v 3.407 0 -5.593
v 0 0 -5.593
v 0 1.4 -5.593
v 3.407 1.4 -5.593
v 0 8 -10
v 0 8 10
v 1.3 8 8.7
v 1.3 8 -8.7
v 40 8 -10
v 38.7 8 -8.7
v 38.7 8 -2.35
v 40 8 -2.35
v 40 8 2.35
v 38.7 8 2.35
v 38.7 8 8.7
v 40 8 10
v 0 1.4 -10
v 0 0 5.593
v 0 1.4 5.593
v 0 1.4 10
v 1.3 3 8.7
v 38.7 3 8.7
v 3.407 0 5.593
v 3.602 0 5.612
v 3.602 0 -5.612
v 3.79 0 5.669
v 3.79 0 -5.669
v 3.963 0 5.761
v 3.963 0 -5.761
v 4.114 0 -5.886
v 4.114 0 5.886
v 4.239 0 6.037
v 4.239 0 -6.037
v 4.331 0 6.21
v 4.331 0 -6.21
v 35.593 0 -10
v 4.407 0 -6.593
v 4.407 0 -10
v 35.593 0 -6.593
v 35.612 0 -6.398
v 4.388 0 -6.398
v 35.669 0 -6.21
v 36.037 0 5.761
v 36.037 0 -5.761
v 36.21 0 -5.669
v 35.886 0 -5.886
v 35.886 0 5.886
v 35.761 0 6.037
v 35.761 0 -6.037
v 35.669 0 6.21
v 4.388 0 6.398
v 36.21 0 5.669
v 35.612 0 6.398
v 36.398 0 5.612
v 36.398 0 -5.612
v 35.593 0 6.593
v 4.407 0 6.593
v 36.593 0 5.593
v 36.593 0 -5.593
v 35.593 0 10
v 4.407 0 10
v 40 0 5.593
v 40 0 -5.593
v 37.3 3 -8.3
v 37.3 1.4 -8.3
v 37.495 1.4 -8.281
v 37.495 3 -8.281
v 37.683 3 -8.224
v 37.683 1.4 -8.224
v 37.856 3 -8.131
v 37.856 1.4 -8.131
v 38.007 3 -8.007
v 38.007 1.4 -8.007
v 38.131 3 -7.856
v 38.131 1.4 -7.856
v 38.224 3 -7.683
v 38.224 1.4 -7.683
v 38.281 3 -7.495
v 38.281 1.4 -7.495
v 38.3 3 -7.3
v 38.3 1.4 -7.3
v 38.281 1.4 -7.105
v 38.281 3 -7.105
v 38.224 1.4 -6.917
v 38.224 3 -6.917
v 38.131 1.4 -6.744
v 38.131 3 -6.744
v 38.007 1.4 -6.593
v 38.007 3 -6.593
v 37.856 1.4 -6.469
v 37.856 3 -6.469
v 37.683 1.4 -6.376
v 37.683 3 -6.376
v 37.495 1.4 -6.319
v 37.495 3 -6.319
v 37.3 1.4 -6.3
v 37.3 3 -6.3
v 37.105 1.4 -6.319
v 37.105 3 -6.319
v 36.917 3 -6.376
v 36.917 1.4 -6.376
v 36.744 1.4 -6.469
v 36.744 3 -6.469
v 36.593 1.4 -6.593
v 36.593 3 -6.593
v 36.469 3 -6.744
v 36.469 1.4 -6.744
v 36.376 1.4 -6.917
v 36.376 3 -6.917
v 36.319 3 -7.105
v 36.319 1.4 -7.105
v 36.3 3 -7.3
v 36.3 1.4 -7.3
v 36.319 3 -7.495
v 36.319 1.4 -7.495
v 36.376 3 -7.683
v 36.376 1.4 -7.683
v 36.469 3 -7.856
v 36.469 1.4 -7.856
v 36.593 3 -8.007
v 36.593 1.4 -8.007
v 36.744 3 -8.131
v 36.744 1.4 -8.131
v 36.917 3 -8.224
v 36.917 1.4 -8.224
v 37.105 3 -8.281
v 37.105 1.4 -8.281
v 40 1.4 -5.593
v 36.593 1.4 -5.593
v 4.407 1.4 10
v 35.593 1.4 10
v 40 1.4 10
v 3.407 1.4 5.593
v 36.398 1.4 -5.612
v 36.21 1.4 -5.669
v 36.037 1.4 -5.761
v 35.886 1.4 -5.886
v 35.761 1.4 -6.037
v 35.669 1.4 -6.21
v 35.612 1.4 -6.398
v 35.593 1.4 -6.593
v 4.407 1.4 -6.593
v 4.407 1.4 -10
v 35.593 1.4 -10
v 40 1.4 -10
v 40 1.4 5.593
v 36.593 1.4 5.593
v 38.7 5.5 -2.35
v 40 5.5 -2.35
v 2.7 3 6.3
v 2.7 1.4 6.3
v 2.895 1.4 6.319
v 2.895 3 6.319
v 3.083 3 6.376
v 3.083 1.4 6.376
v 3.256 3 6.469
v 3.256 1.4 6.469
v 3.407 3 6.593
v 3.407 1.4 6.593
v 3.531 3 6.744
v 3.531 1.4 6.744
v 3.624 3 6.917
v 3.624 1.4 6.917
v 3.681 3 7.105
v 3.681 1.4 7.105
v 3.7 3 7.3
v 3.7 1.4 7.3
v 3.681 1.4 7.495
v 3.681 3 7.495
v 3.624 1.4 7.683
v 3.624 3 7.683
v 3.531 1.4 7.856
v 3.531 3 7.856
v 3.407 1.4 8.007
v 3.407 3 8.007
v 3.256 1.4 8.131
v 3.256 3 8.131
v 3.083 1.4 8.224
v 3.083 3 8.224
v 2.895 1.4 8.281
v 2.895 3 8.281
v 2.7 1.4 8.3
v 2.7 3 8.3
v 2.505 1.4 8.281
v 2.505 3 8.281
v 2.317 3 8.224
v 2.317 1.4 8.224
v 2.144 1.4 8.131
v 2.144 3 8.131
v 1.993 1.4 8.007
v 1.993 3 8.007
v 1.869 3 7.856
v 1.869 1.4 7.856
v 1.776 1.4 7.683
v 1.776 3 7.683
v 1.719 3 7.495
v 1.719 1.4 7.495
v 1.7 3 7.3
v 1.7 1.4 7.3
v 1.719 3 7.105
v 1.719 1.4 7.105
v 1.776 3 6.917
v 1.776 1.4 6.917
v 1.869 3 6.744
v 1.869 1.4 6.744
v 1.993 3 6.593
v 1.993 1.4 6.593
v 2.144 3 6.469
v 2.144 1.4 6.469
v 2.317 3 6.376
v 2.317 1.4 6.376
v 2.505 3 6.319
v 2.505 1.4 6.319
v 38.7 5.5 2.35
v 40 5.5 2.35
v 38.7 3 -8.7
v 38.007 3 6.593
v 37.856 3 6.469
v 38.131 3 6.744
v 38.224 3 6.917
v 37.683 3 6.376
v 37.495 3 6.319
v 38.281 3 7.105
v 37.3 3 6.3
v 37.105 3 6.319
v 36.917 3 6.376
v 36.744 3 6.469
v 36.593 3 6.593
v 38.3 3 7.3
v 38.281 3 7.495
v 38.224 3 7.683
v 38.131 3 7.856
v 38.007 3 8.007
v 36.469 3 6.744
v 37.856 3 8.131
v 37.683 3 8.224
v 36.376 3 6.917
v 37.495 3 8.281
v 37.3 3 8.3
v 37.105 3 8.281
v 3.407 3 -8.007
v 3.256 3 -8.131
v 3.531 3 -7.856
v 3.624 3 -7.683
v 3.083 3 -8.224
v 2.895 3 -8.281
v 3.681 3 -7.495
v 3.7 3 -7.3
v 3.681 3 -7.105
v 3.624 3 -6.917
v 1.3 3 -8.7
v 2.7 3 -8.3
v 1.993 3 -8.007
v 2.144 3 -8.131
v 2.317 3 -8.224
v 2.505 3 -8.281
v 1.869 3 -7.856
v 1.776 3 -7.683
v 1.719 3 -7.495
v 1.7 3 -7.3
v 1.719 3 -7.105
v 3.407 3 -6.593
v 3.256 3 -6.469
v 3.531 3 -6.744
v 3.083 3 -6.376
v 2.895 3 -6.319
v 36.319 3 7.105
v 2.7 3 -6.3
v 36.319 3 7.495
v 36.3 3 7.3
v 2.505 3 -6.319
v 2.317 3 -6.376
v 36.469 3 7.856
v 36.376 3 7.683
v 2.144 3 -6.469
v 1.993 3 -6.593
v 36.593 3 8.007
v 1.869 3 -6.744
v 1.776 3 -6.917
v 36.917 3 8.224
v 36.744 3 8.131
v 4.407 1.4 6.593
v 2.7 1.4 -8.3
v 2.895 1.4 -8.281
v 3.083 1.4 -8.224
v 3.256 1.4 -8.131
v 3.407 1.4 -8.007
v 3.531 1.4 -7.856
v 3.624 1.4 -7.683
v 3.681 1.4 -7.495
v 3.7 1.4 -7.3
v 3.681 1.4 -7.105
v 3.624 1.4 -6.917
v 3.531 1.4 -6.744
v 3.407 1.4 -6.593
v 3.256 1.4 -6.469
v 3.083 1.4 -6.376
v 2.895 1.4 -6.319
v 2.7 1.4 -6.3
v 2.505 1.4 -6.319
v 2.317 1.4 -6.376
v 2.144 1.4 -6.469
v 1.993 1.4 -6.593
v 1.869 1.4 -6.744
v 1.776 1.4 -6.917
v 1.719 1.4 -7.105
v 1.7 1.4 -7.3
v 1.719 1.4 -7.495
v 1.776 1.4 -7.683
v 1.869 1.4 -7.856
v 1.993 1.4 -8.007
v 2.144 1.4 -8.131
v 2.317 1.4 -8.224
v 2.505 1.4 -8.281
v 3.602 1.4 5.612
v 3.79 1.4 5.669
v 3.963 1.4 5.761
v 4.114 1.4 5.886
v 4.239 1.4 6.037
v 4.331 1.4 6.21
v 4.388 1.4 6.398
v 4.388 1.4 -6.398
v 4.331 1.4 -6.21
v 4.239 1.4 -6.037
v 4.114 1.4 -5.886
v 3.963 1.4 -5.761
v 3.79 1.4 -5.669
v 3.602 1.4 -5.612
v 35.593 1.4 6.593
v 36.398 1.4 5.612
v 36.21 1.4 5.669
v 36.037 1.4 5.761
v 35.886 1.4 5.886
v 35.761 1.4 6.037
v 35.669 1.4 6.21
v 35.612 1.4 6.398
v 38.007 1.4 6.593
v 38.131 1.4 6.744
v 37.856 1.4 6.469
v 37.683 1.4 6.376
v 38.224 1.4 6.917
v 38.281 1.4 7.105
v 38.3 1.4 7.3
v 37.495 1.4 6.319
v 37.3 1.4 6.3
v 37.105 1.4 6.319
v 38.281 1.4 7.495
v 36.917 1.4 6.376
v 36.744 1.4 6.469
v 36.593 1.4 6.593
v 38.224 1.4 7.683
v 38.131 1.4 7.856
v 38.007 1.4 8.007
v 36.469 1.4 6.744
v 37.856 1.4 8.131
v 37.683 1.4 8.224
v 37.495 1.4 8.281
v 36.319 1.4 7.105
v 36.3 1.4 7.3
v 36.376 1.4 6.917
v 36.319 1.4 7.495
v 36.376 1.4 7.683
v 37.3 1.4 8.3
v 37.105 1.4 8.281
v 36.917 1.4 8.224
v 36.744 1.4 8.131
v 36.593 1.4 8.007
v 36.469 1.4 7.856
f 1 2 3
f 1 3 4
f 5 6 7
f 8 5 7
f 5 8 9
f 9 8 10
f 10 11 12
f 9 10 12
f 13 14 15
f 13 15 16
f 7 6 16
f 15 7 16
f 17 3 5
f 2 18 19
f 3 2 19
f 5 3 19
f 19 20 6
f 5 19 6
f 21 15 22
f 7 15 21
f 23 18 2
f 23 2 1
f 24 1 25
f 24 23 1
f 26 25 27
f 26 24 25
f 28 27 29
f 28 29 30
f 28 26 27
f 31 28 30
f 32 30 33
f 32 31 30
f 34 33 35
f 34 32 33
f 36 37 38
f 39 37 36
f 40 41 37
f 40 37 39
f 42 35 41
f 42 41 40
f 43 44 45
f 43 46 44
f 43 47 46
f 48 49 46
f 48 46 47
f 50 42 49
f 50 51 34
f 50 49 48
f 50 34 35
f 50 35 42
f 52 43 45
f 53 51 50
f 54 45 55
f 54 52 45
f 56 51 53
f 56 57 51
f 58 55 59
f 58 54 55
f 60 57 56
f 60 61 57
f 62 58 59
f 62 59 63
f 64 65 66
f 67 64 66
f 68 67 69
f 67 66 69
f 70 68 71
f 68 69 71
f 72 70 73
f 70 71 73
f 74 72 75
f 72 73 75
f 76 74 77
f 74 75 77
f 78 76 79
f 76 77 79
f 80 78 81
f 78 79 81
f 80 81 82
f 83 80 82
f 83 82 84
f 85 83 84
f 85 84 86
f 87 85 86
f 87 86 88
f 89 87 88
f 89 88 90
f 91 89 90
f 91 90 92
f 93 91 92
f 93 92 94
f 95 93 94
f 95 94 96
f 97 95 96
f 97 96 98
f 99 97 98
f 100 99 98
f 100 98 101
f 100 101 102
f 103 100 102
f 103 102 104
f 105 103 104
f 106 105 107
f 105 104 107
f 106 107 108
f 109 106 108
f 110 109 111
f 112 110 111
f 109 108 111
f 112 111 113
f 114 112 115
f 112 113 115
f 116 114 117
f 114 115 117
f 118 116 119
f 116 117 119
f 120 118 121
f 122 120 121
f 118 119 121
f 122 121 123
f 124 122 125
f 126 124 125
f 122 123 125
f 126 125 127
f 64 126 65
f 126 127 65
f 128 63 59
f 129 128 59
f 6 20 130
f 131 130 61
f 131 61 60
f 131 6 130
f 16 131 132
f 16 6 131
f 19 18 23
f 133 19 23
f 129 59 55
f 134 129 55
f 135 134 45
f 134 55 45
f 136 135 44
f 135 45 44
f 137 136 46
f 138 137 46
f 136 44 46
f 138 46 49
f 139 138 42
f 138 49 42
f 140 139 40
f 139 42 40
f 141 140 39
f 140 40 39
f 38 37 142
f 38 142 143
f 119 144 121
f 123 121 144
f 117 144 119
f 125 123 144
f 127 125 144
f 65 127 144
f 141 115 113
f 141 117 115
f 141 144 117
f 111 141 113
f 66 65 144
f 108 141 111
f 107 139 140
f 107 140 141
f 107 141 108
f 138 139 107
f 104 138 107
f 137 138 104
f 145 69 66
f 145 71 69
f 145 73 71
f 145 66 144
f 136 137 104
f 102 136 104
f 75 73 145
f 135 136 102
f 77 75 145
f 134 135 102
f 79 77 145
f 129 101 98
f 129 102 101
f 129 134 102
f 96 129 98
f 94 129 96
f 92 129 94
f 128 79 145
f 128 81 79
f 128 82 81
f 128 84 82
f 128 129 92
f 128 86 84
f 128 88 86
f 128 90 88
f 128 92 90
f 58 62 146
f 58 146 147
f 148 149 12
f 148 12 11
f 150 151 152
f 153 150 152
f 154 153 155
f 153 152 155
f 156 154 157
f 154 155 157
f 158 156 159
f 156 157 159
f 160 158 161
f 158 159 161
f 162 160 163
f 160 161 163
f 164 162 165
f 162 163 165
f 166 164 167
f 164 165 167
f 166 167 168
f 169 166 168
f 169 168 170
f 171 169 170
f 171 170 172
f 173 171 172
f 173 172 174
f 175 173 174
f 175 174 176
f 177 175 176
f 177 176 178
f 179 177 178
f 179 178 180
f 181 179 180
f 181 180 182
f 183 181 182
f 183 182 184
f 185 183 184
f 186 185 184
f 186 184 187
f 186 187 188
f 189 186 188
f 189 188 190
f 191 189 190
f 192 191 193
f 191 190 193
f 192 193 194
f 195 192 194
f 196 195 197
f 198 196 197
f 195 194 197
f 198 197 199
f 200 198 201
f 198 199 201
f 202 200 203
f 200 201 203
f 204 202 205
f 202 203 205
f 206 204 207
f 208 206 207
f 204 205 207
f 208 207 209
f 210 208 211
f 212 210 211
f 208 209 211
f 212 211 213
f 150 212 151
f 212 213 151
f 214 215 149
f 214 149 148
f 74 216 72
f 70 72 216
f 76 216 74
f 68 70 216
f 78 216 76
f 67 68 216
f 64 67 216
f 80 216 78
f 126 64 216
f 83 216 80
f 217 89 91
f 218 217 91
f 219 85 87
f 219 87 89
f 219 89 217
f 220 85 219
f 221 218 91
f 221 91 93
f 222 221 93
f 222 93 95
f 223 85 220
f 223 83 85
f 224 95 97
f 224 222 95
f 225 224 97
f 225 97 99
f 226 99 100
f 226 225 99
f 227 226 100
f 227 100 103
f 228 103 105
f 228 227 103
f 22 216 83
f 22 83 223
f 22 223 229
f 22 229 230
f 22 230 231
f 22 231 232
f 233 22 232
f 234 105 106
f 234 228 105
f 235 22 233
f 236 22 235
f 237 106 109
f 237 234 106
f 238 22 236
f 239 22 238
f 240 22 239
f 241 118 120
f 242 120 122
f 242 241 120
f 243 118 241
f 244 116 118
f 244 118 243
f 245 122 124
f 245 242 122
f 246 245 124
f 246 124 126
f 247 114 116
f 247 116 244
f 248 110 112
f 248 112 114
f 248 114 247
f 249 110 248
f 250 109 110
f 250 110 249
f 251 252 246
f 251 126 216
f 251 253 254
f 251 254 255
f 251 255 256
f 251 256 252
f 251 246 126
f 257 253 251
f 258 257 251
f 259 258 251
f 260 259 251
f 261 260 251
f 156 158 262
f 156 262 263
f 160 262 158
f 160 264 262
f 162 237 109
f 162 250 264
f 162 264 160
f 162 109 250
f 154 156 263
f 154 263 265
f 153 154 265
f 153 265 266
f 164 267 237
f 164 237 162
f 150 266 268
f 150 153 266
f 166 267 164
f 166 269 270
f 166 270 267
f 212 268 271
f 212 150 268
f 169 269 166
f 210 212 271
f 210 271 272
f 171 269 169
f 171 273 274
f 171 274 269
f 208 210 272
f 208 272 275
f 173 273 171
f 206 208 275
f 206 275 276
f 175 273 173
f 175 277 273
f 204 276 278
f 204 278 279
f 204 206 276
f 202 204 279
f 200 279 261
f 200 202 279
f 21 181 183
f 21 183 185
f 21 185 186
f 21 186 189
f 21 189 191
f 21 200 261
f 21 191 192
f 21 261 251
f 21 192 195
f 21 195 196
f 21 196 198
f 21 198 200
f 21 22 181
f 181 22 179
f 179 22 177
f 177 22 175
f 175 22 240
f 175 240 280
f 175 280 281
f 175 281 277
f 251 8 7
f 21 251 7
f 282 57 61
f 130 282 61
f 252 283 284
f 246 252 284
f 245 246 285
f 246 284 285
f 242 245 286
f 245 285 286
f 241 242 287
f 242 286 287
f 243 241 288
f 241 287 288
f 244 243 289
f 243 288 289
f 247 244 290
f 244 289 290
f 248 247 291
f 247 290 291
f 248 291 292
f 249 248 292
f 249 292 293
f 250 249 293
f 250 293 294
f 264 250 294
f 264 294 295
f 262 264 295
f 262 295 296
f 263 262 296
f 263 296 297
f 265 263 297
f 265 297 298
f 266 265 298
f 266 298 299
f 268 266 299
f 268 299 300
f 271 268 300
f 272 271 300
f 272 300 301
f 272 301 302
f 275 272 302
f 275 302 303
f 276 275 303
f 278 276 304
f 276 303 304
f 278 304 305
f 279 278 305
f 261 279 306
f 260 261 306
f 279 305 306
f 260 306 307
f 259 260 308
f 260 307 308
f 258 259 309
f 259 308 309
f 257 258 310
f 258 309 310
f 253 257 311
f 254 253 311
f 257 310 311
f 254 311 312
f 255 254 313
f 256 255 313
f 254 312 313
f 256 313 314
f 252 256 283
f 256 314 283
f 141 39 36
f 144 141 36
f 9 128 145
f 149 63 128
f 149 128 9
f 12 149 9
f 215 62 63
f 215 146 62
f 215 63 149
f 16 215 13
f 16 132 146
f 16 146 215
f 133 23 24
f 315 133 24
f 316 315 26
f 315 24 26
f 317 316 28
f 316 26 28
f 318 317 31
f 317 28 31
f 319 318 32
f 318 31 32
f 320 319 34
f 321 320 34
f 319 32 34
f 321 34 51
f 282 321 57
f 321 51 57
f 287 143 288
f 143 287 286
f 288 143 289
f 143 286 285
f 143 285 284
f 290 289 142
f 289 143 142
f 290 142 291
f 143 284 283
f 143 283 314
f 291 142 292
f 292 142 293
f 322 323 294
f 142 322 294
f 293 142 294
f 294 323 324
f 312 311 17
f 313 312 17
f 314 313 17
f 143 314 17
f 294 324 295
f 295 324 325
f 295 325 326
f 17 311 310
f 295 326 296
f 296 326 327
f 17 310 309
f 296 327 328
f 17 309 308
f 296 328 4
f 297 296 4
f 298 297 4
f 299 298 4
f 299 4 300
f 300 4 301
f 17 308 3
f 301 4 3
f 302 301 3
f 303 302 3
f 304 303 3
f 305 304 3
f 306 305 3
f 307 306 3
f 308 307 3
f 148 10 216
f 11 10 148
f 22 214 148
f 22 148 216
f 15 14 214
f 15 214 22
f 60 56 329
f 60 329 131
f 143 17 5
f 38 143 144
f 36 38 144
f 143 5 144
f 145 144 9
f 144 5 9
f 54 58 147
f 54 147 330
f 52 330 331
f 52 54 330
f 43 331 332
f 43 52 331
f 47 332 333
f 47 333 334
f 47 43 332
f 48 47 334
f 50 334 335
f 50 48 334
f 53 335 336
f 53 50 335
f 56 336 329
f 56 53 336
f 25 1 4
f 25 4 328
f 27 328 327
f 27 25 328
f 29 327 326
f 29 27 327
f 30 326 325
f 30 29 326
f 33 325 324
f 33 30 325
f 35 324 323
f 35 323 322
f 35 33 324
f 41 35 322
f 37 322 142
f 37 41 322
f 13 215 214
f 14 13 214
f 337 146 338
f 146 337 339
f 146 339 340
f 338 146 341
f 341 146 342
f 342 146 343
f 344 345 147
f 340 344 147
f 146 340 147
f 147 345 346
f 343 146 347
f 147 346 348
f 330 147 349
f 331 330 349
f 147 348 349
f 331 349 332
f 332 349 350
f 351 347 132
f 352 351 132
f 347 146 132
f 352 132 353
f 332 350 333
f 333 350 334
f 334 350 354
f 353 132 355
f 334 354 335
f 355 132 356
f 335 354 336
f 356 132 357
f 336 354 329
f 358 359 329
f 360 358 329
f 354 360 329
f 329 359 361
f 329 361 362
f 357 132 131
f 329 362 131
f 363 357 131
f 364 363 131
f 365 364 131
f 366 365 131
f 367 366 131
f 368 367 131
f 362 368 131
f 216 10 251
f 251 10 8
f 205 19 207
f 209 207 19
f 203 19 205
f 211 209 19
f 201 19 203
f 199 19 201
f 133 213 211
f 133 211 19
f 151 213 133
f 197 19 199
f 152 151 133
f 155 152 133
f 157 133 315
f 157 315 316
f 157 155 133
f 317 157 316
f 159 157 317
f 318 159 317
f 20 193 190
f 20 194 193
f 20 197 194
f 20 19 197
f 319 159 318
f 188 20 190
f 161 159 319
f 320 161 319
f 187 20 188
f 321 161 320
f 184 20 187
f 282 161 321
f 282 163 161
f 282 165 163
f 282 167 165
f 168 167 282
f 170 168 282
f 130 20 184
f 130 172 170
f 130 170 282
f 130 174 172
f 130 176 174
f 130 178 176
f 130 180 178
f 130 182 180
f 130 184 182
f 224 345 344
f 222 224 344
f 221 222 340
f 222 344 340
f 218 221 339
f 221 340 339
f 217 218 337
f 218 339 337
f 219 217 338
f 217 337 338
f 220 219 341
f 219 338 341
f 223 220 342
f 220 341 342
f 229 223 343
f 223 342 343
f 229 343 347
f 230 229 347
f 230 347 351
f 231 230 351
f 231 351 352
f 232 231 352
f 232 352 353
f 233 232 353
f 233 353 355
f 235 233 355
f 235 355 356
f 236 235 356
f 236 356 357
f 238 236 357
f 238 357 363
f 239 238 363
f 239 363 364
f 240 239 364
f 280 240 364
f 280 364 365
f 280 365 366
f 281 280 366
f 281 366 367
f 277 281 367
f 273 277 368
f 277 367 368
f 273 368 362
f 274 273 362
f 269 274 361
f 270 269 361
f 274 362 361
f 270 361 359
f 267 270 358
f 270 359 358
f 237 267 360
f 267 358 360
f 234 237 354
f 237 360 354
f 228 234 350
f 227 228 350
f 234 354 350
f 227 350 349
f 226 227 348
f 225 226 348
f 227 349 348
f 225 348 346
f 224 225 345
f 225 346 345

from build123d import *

# Parameters (mm, degrees)
ESQUISSE1_W             = 40
ESQUISSE1_H             = 8
EXTRUSION1_DEPTH        = 10
ESQUISSE2_W             = 37.4
ESQUISSE2_H             = 17.4
ENL_V_MAT_EXTRU_1_DEPTH = 5
ESQUISSE3_W             = 1.3
ESQUISSE3_H             = 4.7
ENL_V_MAT_EXTRU_2_DEPTH = 2.5
ESQUISSE4_R             = 1
ENL_V_MAT_EXTRU_3_DEPTH = 43
ENL_V_MAT_EXTRU_4_DEPTH = 1.4


with BuildPart() as part:
    # Esquisse1 → Extrusion1 (new, symmetric)
    with BuildSketch(Plane.XY):
        with Locations((20, 4)):
            Rectangle(ESQUISSE1_W, ESQUISSE1_H)
    extrude(amount=EXTRUSION1_DEPTH, both=True)

    # Esquisse2 → Enlèv. mat.-Extru.1 (cut)
    with BuildSketch(Plane(origin=(0, 8, 0), x_dir=(-1, 0, 0), z_dir=(0, 1, 0))):
        with Locations((-20, 0)):
            Rectangle(ESQUISSE2_W, ESQUISSE2_H)
    extrude(amount=-ENL_V_MAT_EXTRU_1_DEPTH, mode=Mode.SUBTRACT)

    # Esquisse3 → Enlèv. mat.-Extru.2 (cut)
    with BuildSketch(Plane(origin=(0, 8, 0), x_dir=(-1, 0, 0), z_dir=(0, 1, 0))):
        with Locations((-39.35, 0)):
            Rectangle(ESQUISSE3_W, ESQUISSE3_H)
    extrude(amount=-ENL_V_MAT_EXTRU_2_DEPTH, mode=Mode.SUBTRACT)

    # Esquisse4 → Enlèv. mat.-Extru.3 (cut, through all)
    with BuildSketch(Plane.XZ):
        with Locations(Location((37.3, 7.3, 0), (0, 0, 270))):
            Circle(ESQUISSE4_R)
        with Locations(Location((37.3, -7.3, 0), (0, 0, 270))):
            Circle(ESQUISSE4_R)
        with Locations(Location((2.7, -7.3, 0), (0, 0, 270))):
            Circle(ESQUISSE4_R)
        with Locations(Location((2.7, 7.3, 0), (0, 0, 270))):
            Circle(ESQUISSE4_R)
    extrude(amount=-ENL_V_MAT_EXTRU_3_DEPTH, mode=Mode.SUBTRACT)

    # Esquisse5 → Enlèv. mat.-Extru.4 (cut)
    with BuildSketch(Plane.XZ):
        with BuildLine():
            Line((40, -5.592893219), (36.592893219, -5.592893219))
            ThreePointArc((36.592893219, -5.592893219), (35.885786438, -5.885786438), (35.592893219, -6.592893219))
            Line((35.592893219, -6.592893219), (35.592893219, -10))
            Line((35.592893219, -10), (40, -10))
            Line((40, -10), (40, -5.592893219))
        make_face()
        with BuildLine():
            Line((40, 10), (40, 5.592893219))
            Line((40, 5.592893219), (36.592893219, 5.592893219))
            ThreePointArc((36.592893219, 5.592893219), (35.885786438, 5.885786438), (35.592893219, 6.592893219))
            Line((35.592893219, 6.592893219), (35.592893219, 10))
            Line((35.592893219, 10), (40, 10))
        make_face()
        with BuildLine():
            Line((0, 5.592893219), (3.407106781, 5.592893219))
            ThreePointArc((3.407106781, 5.592893219), (4.114213562, 5.885786438), (4.407106781, 6.592893219))
            Line((4.407106781, 6.592893219), (4.407106781, 10))
            Line((4.407106781, 10), (0, 10))
            Line((0, 10), (0, 5.592893219))
        make_face()
        with BuildLine():
            Line((0, -10), (0, -5.592893219))
            Line((0, -5.592893219), (3.407106781, -5.592893219))
            ThreePointArc((3.407106781, -5.592893219), (4.114213562, -5.885786438), (4.407106781, -6.592893219))
            Line((4.407106781, -6.592893219), (4.407106781, -10))
            Line((4.407106781, -10), (0, -10))
        make_face()
    extrude(amount=-ENL_V_MAT_EXTRU_4_DEPTH, mode=Mode.SUBTRACT)


solid = part.part
